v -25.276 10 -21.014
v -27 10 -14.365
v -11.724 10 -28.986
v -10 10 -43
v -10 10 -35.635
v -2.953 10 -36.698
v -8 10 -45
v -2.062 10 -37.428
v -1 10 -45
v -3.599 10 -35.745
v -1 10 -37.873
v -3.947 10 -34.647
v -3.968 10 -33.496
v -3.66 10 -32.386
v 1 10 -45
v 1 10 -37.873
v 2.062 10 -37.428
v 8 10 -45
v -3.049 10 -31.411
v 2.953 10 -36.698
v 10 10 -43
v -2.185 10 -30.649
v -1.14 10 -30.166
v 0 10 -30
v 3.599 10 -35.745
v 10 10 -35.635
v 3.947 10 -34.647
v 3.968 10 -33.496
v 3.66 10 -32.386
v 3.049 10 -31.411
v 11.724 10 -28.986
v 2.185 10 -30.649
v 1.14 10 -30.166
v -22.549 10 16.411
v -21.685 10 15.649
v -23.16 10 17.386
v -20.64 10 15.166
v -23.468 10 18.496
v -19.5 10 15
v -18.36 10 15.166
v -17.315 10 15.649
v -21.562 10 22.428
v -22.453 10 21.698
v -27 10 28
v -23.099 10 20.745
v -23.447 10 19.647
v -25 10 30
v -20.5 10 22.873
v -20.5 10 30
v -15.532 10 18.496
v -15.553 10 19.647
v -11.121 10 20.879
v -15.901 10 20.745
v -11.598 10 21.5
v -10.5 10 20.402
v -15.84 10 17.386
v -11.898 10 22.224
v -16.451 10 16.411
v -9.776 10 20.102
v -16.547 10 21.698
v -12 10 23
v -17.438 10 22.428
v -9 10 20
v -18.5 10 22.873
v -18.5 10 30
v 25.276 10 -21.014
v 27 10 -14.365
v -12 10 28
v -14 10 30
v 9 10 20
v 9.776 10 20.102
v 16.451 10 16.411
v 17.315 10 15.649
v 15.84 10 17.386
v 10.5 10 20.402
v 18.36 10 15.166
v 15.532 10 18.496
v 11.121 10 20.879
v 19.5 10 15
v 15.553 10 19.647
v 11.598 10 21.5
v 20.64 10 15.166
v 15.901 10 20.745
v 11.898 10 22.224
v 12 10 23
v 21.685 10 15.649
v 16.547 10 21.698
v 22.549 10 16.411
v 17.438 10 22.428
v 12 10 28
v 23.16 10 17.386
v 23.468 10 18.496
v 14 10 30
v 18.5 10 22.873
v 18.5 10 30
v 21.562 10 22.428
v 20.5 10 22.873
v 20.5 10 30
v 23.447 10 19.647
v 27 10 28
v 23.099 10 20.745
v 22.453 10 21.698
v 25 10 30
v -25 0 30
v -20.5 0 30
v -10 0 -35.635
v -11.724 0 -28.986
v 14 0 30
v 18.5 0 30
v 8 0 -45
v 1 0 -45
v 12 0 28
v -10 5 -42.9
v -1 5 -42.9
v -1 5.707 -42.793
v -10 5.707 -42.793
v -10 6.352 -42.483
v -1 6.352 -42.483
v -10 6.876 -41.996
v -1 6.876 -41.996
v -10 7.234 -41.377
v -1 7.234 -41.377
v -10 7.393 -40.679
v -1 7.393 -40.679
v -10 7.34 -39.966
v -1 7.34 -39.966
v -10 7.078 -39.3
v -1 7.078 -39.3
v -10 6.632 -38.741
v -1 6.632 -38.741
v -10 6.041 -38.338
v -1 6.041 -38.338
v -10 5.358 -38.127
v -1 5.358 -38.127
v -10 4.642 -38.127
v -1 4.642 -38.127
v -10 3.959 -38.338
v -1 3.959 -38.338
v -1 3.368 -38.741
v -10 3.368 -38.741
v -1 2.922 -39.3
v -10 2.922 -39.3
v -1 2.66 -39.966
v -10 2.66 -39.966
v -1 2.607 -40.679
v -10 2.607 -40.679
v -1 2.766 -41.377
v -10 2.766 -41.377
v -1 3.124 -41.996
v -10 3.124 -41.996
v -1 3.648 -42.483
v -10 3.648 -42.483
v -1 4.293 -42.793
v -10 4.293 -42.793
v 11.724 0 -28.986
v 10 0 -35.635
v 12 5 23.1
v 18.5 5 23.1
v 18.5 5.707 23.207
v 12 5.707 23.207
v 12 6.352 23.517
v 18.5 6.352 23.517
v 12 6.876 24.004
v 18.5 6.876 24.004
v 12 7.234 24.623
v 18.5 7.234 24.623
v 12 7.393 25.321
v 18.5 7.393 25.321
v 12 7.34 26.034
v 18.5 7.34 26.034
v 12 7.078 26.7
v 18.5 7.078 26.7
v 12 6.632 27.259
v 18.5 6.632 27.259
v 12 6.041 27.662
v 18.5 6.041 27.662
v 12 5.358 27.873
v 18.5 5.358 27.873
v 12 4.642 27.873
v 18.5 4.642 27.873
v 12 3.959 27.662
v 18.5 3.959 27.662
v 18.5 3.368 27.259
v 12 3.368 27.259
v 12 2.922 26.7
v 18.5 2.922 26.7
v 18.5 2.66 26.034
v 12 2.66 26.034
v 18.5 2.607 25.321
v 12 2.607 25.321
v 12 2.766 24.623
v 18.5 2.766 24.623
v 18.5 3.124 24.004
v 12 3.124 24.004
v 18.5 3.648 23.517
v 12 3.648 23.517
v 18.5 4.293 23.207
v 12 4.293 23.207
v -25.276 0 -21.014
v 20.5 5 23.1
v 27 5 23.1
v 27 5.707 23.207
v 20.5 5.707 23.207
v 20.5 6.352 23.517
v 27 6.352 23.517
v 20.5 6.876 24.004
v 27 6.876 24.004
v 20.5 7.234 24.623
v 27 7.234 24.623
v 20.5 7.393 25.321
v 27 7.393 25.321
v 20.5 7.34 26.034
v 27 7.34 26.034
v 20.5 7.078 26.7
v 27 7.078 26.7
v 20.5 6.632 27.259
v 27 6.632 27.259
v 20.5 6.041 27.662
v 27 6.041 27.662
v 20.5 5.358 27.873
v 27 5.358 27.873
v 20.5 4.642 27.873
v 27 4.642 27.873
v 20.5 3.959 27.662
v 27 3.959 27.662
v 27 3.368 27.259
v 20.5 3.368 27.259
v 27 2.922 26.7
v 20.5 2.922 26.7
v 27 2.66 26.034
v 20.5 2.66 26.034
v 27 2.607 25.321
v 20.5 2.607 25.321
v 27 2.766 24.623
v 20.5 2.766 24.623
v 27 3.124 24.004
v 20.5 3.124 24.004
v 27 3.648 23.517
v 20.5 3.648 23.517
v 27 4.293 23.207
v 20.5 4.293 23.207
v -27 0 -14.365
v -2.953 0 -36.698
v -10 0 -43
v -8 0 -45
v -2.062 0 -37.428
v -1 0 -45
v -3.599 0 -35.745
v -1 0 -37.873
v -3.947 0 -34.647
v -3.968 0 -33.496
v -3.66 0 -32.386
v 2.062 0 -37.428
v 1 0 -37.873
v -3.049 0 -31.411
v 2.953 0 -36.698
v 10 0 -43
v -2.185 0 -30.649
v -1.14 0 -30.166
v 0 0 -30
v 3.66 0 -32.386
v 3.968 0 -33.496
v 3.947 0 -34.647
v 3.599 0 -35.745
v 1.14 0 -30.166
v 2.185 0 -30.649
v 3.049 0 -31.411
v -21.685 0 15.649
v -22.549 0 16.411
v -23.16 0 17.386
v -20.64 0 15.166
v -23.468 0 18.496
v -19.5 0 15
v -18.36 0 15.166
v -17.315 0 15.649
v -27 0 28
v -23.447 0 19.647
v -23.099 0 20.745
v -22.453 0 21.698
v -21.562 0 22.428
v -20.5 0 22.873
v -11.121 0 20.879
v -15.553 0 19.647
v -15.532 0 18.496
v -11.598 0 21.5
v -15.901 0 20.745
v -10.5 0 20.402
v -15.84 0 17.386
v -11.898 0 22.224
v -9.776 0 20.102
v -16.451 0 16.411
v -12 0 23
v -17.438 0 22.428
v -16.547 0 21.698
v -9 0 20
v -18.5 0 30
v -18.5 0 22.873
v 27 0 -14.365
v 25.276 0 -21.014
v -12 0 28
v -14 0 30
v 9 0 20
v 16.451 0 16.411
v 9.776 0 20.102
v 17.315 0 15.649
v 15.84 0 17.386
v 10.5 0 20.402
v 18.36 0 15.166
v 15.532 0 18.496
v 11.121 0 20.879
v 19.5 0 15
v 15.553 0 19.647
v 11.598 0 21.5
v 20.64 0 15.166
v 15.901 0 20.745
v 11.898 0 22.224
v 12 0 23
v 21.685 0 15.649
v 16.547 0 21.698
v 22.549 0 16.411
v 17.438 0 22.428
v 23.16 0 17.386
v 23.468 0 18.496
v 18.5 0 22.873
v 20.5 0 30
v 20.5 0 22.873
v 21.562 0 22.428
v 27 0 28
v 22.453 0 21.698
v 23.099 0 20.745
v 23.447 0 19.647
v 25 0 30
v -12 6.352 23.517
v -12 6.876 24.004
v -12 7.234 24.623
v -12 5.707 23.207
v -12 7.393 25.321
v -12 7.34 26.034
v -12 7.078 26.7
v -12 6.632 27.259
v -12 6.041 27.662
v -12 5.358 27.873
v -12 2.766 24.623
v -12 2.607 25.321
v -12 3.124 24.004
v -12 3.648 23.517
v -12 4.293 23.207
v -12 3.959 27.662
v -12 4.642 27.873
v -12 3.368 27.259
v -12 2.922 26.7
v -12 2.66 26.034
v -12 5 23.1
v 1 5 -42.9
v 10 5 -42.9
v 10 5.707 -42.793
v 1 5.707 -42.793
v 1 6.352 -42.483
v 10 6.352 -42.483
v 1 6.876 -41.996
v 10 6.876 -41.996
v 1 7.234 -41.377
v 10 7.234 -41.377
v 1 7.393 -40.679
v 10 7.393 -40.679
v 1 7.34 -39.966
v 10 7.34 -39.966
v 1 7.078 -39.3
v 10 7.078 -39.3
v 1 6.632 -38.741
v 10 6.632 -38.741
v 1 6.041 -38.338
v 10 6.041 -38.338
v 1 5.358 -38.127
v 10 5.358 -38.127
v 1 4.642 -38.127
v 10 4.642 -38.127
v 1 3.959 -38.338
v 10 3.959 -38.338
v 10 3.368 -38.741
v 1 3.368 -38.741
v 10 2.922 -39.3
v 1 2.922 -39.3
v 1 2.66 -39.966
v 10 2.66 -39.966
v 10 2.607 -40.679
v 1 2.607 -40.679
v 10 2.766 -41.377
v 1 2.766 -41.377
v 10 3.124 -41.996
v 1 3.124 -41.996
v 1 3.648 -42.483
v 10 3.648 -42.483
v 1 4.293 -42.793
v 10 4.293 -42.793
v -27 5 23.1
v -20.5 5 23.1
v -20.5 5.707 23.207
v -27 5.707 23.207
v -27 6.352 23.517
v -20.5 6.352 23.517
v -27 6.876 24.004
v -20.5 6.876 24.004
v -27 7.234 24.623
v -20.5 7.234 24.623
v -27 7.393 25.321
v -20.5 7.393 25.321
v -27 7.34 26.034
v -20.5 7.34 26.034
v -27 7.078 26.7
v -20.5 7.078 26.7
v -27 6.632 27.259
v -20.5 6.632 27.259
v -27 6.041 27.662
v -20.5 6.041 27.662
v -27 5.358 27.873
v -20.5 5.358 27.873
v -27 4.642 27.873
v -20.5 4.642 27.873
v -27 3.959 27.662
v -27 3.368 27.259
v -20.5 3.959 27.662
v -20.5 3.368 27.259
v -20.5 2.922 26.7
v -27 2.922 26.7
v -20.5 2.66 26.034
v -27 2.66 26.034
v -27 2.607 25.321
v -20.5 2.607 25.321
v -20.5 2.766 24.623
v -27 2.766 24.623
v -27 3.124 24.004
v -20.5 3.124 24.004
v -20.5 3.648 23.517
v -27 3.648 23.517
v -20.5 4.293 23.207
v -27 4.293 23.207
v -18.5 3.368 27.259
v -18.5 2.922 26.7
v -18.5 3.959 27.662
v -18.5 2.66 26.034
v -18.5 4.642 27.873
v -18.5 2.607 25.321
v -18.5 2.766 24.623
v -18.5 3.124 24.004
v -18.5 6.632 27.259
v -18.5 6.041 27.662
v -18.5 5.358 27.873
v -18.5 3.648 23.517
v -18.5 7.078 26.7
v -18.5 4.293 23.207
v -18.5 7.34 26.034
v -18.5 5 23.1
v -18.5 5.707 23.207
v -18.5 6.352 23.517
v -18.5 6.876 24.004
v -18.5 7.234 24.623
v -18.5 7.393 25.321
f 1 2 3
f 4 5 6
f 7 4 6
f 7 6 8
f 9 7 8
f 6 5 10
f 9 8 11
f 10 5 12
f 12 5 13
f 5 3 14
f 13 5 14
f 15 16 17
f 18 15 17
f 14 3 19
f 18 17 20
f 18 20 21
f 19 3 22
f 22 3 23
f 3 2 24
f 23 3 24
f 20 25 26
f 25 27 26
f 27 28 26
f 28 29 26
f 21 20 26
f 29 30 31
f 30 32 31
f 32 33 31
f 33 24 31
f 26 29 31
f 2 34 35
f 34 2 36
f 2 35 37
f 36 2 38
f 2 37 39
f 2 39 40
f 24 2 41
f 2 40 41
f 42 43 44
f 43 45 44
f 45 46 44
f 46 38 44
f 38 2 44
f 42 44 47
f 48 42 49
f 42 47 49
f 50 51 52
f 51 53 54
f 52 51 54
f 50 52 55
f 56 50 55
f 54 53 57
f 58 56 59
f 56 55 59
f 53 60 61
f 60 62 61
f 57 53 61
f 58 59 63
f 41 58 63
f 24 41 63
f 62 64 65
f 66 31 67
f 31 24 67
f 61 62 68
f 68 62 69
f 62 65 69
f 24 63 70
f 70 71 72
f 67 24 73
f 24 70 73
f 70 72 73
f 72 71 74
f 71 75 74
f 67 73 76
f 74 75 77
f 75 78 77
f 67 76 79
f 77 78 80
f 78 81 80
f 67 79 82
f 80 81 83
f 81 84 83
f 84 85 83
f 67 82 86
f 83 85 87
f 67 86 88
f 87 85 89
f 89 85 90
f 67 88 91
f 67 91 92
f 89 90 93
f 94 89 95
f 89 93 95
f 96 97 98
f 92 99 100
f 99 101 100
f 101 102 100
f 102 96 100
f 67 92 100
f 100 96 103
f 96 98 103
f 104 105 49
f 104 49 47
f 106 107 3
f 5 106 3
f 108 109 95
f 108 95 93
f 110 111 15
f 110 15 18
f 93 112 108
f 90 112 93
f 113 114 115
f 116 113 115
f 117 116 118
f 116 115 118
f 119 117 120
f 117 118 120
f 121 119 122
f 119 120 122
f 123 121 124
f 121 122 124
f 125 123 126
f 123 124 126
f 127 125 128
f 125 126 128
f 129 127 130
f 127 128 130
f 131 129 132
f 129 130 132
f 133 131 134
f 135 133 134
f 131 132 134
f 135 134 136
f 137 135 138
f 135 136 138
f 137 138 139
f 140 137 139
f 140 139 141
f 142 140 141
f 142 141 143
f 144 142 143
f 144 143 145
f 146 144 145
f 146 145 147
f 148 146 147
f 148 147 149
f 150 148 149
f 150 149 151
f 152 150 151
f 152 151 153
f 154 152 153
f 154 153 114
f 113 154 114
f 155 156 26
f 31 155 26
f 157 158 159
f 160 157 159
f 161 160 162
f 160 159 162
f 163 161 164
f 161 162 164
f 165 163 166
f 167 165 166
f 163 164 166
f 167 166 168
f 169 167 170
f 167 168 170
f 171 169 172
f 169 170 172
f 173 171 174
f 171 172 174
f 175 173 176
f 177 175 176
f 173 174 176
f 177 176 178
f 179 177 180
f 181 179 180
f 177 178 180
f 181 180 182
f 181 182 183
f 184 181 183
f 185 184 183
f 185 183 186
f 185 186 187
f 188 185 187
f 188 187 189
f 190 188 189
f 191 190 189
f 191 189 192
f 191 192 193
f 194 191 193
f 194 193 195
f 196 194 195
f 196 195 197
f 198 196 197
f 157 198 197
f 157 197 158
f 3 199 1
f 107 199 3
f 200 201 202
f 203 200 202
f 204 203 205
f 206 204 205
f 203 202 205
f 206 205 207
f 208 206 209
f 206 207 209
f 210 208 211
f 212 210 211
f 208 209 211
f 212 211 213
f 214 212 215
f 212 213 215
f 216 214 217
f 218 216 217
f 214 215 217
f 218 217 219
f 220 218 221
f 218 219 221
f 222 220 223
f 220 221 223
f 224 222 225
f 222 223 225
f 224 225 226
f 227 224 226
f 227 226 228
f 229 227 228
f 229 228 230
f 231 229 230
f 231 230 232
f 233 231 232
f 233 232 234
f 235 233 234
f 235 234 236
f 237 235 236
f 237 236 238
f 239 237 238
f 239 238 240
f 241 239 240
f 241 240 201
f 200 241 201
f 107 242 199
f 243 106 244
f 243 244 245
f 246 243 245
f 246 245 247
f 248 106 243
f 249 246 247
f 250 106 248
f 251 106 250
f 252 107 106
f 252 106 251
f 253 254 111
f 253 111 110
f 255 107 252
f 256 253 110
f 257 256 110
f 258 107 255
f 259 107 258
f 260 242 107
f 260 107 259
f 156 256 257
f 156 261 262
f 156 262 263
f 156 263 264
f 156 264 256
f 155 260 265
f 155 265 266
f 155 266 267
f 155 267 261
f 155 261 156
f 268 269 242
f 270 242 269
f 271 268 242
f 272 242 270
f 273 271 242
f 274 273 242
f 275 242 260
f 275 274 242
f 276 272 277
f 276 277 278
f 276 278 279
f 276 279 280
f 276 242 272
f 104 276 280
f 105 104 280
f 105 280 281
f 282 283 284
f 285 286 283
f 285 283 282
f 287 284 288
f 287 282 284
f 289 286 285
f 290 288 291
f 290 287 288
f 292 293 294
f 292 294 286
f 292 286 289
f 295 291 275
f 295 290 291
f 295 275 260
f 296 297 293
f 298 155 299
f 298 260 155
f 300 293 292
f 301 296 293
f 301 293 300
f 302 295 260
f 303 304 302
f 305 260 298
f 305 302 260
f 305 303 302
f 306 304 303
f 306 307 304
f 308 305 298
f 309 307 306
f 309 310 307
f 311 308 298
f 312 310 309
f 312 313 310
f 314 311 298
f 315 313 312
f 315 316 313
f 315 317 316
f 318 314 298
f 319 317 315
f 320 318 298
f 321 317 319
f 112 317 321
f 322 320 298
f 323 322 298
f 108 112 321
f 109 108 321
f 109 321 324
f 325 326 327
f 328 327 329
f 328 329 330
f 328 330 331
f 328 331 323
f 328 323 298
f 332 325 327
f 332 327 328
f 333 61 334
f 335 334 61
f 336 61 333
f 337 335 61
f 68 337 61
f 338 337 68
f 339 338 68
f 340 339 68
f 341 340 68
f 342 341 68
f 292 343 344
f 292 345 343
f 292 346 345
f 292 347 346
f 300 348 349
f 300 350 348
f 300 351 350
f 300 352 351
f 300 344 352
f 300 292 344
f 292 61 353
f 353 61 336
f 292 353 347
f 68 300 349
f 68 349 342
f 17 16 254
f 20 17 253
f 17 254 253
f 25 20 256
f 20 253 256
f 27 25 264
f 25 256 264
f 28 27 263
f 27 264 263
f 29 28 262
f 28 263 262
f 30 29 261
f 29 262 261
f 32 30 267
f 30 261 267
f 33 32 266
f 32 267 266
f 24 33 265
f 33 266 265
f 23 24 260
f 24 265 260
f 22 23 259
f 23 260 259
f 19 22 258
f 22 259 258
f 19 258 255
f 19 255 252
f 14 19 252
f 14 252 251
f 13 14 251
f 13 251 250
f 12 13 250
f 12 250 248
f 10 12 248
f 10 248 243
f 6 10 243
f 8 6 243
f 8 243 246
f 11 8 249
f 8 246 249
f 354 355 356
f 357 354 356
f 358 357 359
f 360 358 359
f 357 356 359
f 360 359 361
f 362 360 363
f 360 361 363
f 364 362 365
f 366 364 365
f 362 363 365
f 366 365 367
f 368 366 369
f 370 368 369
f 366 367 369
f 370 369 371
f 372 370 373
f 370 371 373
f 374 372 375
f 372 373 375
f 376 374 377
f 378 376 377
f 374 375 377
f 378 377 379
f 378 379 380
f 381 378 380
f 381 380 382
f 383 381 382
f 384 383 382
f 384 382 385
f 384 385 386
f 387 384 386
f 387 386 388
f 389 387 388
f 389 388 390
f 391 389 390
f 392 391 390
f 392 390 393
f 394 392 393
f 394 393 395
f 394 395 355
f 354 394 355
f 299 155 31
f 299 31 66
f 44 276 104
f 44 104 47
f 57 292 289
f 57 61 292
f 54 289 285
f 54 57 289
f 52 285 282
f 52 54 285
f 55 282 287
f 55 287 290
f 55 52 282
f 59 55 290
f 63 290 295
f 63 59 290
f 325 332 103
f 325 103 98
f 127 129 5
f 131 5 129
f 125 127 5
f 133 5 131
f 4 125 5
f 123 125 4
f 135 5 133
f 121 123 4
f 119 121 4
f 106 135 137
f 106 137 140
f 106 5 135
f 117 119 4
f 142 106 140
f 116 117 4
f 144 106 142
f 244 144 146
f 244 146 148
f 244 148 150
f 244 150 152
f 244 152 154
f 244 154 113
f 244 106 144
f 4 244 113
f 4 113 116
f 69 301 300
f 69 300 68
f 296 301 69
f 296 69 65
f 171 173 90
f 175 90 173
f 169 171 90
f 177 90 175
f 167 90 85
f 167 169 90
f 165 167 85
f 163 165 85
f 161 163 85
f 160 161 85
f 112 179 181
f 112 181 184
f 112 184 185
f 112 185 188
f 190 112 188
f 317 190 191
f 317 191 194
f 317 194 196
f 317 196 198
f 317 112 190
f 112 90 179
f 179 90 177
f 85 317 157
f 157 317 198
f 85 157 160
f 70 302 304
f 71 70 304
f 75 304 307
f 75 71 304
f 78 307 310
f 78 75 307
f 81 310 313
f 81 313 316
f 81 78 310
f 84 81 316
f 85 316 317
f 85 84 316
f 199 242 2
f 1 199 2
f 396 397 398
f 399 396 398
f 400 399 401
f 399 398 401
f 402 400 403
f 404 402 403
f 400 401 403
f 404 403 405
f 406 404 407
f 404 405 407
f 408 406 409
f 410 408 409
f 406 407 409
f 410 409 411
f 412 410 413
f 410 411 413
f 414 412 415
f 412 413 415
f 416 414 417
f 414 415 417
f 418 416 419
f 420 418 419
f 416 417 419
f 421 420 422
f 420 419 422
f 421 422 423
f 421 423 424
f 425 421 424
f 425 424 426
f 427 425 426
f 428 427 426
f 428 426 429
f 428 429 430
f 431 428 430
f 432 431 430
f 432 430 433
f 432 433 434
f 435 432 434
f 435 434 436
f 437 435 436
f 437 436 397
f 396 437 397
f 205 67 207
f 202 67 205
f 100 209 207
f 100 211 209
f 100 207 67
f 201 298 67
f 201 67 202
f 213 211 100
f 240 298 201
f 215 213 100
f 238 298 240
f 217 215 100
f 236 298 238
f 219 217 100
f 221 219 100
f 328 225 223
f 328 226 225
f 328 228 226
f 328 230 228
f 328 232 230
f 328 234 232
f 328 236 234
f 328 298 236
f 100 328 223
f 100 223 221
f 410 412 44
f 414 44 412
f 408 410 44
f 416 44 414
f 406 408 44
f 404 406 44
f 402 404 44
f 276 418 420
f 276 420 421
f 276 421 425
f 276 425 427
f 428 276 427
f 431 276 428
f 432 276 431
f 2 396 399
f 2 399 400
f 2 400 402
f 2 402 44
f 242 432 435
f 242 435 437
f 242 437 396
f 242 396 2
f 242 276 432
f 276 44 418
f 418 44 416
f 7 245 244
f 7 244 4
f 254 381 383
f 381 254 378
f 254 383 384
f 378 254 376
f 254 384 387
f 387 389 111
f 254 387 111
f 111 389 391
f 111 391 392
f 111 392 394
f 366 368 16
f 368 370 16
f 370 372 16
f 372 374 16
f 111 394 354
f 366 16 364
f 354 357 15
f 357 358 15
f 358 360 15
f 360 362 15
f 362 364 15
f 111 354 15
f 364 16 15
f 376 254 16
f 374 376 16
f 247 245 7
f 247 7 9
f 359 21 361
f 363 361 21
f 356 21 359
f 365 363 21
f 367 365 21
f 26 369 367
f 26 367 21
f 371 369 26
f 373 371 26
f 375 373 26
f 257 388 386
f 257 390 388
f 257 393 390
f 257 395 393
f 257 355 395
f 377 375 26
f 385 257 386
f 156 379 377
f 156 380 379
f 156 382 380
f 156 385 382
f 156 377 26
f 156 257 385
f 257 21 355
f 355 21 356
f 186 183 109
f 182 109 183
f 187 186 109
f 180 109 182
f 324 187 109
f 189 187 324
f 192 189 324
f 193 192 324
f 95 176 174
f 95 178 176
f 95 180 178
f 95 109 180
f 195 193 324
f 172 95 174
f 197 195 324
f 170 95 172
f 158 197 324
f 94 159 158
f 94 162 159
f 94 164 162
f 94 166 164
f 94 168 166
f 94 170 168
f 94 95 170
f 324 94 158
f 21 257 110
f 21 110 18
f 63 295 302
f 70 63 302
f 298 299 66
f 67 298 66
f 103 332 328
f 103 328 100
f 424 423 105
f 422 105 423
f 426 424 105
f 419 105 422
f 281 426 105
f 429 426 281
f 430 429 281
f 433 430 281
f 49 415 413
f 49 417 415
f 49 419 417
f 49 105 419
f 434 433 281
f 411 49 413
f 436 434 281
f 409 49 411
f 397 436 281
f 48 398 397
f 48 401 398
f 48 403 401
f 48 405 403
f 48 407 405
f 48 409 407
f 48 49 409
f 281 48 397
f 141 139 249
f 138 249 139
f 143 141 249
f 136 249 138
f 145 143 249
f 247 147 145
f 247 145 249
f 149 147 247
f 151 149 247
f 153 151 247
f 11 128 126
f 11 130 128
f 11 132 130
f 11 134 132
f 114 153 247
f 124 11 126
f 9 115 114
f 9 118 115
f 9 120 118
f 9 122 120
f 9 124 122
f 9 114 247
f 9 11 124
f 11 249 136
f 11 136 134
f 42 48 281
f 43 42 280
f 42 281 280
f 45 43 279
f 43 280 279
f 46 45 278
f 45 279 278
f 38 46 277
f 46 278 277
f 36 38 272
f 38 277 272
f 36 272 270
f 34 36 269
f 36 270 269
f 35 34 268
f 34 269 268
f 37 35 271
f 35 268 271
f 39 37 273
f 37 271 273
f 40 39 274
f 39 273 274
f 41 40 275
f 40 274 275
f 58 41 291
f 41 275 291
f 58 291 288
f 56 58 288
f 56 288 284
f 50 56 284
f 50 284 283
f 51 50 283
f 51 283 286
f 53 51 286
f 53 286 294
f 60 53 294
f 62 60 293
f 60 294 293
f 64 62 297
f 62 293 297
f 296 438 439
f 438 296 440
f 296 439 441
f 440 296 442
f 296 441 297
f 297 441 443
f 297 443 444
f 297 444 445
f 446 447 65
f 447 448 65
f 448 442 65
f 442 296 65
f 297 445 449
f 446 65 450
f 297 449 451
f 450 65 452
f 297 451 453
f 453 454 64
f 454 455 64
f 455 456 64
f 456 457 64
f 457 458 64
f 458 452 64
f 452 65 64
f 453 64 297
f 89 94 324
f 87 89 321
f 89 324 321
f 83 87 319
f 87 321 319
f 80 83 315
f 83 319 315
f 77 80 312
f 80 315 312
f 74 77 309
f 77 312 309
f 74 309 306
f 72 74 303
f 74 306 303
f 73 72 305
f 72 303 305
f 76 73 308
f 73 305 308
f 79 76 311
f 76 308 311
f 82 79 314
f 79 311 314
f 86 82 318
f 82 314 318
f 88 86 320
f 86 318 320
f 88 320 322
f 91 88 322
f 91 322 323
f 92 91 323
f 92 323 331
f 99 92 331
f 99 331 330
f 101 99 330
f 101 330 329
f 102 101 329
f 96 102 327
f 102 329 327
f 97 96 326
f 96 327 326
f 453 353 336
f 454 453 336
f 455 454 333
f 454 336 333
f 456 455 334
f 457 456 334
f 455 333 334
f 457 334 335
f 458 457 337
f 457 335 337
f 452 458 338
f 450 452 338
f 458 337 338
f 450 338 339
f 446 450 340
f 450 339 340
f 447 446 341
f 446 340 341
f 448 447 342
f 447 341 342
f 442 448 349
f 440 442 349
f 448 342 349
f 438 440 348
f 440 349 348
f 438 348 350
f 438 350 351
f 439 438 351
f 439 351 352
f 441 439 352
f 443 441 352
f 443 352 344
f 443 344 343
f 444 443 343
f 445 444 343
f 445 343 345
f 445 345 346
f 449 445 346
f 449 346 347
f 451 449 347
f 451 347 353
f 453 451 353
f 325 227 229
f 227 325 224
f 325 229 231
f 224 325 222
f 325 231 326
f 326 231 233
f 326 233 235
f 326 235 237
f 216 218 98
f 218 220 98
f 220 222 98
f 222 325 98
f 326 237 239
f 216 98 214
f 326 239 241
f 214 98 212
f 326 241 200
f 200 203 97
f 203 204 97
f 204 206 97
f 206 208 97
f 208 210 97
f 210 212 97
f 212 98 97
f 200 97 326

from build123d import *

# Parameters (mm, degrees)
SKETCH1_W             = 24
SKETCH1_H             = 40
BOSS_EXTRUDE1_DEPTH   = 10
SKETCH2_R             = 4
BOSS_EXTRUDE2_DEPTH   = 10
SKETCH4_W             = 2
SKETCH4_H             = 15
CUT_EXTRUDE1_DEPTH    = 20
SKETCH5_R             = 2.4
CUT_EXTRUDE2_DEPTH    = 56
CHAMFER2_SIZE         = 2
CHAMFER3_SIZE2        = 2
CHAMFER3_SIZE         = 5.63516655
CHAMFER3_EDGE_2_SIZE2 = 5.63516655
CHAMFER3_EDGE_2_SIZE  = 2
CHAMFER3_EDGE_3_SIZE2 = 2
CHAMFER3_EDGE_3_SIZE  = 5.63516655
CHAMFER3_EDGE_4_SIZE2 = 5.63516655
CHAMFER3_EDGE_4_SIZE  = 2
FILLET2_R             = 3


with BuildPart() as part:
    # Sketch1 → Boss-Extrude1 (new body)
    with BuildSketch(Plane(origin=(0, 0, 0), x_dir=(1, 0, 0), z_dir=(0, 1, 0))):
        Rectangle(SKETCH1_W, SKETCH1_H)
    extrude(amount=BOSS_EXTRUDE1_DEPTH)

    # Sketch2 → Boss-Extrude2 (add)
    with BuildSketch(Plane.XZ):
        Polygon((-12, -20), (-12, 30), (-27, 30), (-27, -20), (-10, -30), (-10, -45), (10, -45), (10, -30), (27, -20), (27, 30), (12, 30), (12, -20), align=None)
        with Locations((0, -34)):
            Circle(SKETCH2_R, mode=Mode.SUBTRACT)
        with Locations((-19.5, 19)):
            Circle(SKETCH2_R, mode=Mode.SUBTRACT)
        with Locations((19.5, 19)):
            Circle(SKETCH2_R, mode=Mode.SUBTRACT)
    extrude(amount=-BOSS_EXTRUDE2_DEPTH)

    # Sketch4 → Cut-Extrude1 (cut)
    with BuildSketch(Plane(origin=(0, 10, 0), x_dir=(1, 0, 0), z_dir=(0, 1, 0))):
        with Locations((19.5, -30)):
            Rectangle(SKETCH4_W, SKETCH4_H)
        with Locations((-19.5, -30)):
            Rectangle(SKETCH4_W, SKETCH4_H)
        with Locations((0, 45)):
            Rectangle(SKETCH4_W, SKETCH4_H)
    extrude(amount=-CUT_EXTRUDE1_DEPTH, mode=Mode.SUBTRACT)

    # Sketch5 → Cut-Extrude2 (cut)
    with BuildSketch(Plane(origin=(27, 0, 0), x_dir=(0, 0, -1), z_dir=(1, 0, 0))):
        with Locations((-25.5, 5)):
            Circle(SKETCH5_R)
        with Locations((40.5, 5)):
            Circle(SKETCH5_R)
    extrude(amount=-CUT_EXTRUDE2_DEPTH, mode=Mode.SUBTRACT)

    # Chamfer2
    chamfer2_edges = [part.edges().sort_by_distance(p)[0] for p in [
        (-12, 5, 30),
        (12, 5, 30),
        (27, 5, 30),
        (10, 5, -45),
        (-10, 5, -45),
        (-27, 5, 30),
    ]]
    chamfer(chamfer2_edges, length=CHAMFER2_SIZE)

    # Chamfer3
    chamfer3_edges = [part.edges().sort_by_distance(p)[0] for p in [
        (27, 5, -20),
    ]]
    chamfer(chamfer3_edges, length=CHAMFER3_SIZE, length2=CHAMFER3_SIZE2)

    # Chamfer3 edge 2
    chamfer3_edge_2_edges = [part.edges().sort_by_distance(p)[0] for p in [
        (10, 5, -30),
    ]]
    chamfer(chamfer3_edge_2_edges, length=CHAMFER3_EDGE_2_SIZE, length2=CHAMFER3_EDGE_2_SIZE2)

    # Chamfer3 edge 3
    chamfer3_edge_3_edges = [part.edges().sort_by_distance(p)[0] for p in [
        (-10, 5, -30),
    ]]
    chamfer(chamfer3_edge_3_edges, length=CHAMFER3_EDGE_3_SIZE, length2=CHAMFER3_EDGE_3_SIZE2)

    # Chamfer3 edge 4
    chamfer3_edge_4_edges = [part.edges().sort_by_distance(p)[0] for p in [
        (-27, 5, -20),
    ]]
    chamfer(chamfer3_edge_4_edges, length=CHAMFER3_EDGE_4_SIZE, length2=CHAMFER3_EDGE_4_SIZE2)

    # Fillet2
    fillet2_edges = [part.edges().sort_by_distance(p)[0] for p in [
        (12, 5, 20),
        (-12, 5, 20),
    ]]
    fillet(fillet2_edges, radius=FILLET2_R)


solid = part.part
